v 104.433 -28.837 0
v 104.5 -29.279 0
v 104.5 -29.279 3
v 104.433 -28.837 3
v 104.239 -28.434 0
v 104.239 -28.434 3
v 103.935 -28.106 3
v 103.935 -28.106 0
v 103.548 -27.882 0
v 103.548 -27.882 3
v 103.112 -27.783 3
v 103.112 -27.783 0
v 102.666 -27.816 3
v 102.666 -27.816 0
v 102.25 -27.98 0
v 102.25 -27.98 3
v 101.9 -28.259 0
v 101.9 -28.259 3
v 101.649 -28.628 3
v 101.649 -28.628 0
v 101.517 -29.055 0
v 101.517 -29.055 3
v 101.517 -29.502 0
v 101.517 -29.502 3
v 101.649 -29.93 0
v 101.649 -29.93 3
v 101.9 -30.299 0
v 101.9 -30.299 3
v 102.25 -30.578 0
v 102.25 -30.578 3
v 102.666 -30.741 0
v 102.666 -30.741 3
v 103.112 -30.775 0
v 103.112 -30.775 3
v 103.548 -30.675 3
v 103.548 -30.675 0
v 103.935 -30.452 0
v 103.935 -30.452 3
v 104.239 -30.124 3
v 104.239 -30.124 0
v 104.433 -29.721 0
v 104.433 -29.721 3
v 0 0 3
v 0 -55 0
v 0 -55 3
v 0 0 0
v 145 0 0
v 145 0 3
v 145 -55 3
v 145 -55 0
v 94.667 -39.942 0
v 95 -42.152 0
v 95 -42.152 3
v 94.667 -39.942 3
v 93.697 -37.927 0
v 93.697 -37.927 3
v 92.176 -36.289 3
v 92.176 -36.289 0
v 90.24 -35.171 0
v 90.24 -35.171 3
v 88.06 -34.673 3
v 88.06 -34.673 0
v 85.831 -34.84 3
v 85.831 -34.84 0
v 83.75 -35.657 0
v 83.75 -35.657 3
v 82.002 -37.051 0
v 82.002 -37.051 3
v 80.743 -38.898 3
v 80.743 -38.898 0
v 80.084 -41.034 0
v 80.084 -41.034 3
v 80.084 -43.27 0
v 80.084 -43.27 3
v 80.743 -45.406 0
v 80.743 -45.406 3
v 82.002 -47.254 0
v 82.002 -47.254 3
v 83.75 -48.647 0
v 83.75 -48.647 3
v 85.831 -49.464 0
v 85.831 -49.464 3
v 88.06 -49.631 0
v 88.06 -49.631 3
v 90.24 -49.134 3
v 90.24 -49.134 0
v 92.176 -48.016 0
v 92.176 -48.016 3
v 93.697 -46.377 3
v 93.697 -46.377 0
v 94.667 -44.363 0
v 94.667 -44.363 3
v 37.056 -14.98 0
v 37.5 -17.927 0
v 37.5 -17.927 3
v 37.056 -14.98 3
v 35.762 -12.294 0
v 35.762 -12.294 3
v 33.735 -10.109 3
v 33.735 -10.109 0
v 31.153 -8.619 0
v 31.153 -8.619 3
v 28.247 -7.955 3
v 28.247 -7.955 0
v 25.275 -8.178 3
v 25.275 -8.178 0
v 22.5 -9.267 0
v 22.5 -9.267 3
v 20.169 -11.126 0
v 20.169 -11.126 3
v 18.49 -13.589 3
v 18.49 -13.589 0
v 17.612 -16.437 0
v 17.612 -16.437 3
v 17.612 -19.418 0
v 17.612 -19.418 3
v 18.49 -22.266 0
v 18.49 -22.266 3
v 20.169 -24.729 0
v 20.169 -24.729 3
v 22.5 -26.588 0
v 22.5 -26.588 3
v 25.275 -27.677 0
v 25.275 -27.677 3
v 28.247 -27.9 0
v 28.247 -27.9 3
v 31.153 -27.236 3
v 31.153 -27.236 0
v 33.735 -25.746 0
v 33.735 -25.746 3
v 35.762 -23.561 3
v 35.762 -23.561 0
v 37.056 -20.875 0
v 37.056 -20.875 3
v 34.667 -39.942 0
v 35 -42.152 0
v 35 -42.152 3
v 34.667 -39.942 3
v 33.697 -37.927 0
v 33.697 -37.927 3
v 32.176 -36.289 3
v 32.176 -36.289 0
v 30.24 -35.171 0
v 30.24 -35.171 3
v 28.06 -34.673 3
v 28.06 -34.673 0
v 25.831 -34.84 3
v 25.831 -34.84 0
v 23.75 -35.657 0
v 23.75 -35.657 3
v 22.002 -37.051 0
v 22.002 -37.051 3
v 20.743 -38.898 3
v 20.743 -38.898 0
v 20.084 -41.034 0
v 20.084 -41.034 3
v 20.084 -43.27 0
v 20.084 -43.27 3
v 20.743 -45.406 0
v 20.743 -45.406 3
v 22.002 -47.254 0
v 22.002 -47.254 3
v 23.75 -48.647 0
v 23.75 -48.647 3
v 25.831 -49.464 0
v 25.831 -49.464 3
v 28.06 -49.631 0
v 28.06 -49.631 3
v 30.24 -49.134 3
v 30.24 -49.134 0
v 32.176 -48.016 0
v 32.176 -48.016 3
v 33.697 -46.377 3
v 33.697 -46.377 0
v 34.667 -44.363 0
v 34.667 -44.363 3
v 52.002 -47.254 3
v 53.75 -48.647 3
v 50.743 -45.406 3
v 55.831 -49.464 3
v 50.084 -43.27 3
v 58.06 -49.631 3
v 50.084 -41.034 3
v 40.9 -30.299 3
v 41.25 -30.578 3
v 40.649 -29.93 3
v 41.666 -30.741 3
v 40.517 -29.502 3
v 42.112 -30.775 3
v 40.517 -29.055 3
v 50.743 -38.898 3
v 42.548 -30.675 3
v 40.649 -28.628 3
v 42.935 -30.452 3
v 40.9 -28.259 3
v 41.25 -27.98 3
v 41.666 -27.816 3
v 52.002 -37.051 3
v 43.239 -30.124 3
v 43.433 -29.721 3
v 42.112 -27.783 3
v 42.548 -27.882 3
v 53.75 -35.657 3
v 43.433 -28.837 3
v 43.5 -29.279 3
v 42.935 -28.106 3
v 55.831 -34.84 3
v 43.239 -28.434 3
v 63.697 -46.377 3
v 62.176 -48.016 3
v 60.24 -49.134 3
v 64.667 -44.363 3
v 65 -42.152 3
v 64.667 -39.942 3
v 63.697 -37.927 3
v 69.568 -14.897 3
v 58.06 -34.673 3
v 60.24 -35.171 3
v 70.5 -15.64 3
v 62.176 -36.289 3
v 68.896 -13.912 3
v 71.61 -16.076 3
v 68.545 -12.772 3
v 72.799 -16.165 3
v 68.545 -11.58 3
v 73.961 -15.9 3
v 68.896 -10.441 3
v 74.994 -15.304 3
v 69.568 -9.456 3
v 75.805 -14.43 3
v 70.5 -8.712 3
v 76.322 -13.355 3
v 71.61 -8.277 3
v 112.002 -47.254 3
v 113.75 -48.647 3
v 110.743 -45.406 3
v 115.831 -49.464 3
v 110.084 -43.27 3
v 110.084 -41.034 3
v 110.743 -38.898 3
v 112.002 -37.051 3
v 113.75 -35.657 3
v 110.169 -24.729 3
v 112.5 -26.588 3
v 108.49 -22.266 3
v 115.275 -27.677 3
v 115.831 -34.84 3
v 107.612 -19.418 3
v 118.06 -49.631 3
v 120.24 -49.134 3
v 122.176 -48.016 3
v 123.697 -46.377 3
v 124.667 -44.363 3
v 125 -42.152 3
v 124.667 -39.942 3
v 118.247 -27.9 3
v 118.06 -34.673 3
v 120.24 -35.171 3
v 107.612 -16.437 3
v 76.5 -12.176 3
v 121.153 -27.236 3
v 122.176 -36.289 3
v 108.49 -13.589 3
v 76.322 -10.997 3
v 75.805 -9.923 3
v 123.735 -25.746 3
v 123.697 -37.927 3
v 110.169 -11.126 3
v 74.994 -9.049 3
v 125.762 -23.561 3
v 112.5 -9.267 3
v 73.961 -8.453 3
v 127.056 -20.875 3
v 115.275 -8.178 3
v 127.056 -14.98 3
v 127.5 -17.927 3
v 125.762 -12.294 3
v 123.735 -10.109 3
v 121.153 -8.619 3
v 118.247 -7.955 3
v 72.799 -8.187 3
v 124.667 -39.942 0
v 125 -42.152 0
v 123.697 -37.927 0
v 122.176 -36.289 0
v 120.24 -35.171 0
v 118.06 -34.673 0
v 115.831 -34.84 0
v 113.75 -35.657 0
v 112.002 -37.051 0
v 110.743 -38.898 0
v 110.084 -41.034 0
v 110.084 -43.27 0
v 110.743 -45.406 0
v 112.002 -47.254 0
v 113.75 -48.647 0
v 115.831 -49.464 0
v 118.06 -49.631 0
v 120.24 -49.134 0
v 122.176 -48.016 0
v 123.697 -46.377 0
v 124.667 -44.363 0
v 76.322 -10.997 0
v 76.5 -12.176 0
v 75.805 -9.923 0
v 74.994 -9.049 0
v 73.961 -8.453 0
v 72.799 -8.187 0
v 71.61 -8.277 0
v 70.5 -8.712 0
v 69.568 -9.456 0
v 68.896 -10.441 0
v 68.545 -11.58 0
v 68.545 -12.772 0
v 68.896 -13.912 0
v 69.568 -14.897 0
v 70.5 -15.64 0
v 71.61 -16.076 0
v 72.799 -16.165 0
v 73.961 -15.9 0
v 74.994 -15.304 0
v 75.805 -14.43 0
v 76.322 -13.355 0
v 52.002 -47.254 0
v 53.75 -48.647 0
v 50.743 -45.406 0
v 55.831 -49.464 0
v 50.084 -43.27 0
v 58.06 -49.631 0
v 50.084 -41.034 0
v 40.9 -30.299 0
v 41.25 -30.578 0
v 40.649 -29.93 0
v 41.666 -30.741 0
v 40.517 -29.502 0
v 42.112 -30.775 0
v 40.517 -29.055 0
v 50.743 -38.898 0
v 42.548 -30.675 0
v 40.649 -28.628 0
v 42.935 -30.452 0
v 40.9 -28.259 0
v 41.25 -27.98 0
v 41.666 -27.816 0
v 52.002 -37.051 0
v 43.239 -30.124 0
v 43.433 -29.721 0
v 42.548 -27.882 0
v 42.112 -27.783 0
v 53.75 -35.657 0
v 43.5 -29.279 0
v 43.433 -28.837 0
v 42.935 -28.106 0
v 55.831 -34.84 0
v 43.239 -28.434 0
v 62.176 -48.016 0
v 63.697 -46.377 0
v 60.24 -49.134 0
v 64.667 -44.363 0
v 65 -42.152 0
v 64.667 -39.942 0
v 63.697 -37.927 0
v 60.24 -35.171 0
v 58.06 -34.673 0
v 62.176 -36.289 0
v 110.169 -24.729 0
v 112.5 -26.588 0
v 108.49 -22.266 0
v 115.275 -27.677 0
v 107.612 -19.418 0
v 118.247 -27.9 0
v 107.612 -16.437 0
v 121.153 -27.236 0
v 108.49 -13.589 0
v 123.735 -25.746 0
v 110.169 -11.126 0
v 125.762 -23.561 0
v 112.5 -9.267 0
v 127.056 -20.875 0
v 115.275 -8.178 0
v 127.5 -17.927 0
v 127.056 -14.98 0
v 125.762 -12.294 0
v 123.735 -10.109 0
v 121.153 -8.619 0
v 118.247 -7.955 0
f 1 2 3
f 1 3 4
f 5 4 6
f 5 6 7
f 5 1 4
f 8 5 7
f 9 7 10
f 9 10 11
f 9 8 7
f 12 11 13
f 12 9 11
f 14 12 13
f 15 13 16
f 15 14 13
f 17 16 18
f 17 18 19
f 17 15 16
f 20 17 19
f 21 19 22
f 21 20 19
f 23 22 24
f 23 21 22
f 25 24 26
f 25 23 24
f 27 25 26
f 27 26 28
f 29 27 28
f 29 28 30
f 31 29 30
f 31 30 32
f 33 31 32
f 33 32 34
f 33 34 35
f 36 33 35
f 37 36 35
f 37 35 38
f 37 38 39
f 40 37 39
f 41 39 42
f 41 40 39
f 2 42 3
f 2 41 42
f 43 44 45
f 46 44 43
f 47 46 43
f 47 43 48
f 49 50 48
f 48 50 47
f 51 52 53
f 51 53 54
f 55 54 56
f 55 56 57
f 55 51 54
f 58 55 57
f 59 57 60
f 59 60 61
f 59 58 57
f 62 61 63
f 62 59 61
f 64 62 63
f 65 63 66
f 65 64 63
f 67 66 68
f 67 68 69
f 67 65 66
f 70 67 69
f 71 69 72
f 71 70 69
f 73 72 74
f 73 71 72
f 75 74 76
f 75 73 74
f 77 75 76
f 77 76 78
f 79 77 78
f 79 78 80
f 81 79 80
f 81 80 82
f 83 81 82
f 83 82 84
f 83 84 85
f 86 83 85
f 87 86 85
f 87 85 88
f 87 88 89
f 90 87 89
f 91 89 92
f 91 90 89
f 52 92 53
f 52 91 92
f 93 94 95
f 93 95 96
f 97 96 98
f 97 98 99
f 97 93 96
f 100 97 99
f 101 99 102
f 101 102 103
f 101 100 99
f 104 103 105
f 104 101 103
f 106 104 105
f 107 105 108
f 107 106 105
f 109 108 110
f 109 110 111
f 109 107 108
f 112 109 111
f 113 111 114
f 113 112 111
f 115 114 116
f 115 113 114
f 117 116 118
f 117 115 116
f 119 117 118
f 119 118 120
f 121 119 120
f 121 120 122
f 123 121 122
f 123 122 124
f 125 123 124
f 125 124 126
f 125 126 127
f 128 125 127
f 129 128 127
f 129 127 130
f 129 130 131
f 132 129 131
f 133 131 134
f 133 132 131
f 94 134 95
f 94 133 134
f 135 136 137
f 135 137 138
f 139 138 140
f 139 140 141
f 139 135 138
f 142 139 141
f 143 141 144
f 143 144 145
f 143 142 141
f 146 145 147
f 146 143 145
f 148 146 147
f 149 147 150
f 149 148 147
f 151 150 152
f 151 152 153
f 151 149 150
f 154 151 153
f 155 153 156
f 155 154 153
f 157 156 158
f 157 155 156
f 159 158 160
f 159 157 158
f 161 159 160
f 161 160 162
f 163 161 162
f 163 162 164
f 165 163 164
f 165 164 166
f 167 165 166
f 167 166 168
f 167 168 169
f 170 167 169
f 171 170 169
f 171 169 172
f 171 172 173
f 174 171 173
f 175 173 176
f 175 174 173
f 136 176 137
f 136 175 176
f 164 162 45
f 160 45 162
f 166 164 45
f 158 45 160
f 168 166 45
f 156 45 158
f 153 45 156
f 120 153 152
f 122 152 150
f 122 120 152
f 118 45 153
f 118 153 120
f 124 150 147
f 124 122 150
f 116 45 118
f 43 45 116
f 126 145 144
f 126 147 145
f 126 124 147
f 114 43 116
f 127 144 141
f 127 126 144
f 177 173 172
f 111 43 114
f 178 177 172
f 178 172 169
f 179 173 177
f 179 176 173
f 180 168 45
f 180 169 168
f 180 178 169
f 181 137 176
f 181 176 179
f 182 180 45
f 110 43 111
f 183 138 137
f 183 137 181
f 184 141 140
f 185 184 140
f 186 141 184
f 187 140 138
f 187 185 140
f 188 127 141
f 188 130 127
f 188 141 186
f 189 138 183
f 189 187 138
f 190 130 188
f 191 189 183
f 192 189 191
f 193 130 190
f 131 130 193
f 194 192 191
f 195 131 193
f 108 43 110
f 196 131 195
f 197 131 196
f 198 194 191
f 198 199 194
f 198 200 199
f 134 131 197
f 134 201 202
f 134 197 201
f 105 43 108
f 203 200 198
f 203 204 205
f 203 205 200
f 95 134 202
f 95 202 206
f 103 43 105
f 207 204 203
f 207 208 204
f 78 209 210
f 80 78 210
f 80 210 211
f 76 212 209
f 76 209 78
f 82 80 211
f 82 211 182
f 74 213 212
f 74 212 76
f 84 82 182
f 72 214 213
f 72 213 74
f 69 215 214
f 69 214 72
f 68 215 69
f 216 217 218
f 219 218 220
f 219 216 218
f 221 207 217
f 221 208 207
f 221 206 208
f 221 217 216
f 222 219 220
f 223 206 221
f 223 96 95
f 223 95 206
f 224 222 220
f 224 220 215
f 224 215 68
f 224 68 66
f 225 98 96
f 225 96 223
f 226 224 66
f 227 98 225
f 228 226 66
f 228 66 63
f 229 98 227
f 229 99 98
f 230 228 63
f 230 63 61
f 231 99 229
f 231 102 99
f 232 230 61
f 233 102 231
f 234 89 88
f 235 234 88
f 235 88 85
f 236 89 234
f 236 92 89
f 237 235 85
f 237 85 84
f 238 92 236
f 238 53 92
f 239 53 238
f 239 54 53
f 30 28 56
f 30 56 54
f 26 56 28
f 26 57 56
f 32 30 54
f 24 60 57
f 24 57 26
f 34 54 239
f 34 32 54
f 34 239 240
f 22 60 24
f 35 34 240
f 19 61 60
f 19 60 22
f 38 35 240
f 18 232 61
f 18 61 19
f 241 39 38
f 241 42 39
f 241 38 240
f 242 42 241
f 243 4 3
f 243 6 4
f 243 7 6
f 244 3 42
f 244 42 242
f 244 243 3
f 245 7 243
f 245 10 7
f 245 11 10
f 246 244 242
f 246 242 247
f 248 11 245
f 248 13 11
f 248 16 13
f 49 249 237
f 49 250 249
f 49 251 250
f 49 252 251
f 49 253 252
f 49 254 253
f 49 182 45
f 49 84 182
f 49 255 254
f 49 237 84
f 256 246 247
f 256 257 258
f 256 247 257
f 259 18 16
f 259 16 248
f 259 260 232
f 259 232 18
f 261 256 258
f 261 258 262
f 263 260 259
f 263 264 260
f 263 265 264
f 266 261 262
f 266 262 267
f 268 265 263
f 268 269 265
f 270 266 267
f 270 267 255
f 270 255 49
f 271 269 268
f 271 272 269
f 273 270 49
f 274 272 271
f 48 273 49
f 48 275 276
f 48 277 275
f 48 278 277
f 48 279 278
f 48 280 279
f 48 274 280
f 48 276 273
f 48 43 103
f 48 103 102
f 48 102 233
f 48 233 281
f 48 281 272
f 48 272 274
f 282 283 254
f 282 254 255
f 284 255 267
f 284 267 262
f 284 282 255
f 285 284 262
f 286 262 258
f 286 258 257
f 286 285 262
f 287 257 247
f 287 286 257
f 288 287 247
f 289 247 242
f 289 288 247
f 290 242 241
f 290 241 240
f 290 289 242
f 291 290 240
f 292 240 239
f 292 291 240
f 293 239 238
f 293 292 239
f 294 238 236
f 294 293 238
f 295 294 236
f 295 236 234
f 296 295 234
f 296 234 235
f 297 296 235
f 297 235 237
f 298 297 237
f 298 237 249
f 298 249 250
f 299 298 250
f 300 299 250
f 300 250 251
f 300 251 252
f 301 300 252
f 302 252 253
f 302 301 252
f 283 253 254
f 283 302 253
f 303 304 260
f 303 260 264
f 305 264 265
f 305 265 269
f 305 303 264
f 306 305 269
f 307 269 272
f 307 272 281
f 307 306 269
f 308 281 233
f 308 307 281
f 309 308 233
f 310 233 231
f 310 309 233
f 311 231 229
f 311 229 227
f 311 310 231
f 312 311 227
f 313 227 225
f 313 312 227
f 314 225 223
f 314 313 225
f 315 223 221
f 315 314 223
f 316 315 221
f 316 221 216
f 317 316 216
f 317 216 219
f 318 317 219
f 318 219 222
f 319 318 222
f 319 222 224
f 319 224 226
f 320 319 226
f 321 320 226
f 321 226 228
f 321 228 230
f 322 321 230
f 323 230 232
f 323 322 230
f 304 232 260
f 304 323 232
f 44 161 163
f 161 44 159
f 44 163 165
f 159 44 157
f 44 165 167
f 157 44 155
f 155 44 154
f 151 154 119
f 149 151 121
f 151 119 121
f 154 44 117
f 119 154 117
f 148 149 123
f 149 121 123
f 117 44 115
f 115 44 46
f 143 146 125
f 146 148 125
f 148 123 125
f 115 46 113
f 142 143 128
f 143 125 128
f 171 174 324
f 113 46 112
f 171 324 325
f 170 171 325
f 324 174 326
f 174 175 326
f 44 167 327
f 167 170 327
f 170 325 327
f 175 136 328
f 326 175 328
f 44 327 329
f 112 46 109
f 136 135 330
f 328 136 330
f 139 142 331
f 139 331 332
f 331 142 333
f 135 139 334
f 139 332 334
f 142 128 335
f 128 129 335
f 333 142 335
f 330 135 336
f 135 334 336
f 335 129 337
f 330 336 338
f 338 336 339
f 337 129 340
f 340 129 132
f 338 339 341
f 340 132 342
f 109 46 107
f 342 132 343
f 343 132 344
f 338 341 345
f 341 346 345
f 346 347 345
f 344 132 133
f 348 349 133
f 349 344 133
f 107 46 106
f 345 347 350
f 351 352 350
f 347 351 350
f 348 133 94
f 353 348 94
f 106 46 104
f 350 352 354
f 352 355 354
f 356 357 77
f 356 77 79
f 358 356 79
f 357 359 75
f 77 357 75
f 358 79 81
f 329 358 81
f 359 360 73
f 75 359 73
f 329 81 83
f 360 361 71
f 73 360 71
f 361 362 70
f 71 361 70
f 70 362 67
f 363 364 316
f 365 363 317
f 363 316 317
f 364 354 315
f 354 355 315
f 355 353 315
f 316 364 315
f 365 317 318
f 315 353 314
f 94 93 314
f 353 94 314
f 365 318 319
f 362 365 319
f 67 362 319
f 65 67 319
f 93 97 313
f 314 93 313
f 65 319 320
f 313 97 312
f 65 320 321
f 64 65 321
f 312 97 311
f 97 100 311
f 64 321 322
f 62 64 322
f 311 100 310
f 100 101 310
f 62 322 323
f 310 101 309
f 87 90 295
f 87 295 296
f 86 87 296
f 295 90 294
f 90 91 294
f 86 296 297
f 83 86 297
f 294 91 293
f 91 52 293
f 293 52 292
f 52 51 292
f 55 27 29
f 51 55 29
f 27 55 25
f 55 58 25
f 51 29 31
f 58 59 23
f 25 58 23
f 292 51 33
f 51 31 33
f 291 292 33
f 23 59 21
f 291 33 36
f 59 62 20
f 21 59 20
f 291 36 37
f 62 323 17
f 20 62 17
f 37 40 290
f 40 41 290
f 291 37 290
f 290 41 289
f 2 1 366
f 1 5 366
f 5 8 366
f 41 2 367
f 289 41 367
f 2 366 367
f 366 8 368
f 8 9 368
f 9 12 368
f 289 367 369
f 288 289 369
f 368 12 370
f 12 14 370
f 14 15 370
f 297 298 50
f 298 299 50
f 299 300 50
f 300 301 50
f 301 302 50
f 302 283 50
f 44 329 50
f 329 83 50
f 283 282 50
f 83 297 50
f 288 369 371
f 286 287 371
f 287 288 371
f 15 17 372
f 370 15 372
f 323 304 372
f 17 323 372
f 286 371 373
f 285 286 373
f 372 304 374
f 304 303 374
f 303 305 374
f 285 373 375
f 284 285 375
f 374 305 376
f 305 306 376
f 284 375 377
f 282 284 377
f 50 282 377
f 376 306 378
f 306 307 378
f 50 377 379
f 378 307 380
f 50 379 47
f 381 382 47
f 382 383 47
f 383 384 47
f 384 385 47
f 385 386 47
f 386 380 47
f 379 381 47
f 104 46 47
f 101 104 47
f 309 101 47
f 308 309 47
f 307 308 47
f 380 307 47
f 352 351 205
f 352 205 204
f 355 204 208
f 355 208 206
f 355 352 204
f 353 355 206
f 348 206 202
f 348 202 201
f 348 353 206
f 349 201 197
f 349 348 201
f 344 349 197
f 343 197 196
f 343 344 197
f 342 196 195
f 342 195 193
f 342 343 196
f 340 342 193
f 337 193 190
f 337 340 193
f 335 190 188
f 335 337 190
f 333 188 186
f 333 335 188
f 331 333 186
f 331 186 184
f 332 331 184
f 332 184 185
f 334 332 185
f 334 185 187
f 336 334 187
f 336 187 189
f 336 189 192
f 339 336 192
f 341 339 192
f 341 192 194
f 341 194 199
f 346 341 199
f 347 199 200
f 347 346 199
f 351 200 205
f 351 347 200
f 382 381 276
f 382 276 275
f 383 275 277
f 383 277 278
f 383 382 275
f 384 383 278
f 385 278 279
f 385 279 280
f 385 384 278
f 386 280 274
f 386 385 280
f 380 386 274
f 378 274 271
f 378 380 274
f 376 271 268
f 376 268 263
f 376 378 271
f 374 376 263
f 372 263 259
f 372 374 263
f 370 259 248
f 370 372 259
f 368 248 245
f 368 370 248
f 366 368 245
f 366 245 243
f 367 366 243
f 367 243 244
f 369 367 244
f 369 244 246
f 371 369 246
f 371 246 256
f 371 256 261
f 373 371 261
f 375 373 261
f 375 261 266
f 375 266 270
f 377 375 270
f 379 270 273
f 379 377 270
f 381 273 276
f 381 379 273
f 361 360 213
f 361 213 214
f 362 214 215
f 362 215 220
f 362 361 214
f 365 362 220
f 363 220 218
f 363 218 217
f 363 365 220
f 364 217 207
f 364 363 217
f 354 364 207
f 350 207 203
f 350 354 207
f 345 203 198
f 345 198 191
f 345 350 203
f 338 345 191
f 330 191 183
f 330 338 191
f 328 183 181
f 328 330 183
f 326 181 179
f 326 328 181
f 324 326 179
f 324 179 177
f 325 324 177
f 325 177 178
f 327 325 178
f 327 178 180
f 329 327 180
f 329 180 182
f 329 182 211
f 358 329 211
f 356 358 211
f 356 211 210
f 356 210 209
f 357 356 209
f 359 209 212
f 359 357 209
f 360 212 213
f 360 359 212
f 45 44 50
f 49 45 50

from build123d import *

# Parameters (mm, degrees)
F0_W     = 145
F0_H     = 55
F0_R     = 7.5
F0_R_2   = 1.5
F0_R_3   = 10
F0_R_4   = 4
F1_DEPTH = 3


with BuildPart() as f1:
    # F0 (on Top) → F1 (new body)
    with BuildSketch(Plane.XY):
        with Locations((72.5, -27.5)):
            Rectangle(F0_W, F0_H)
        with Locations((27.5, -42.152297)):
            Circle(F0_R, mode=Mode.SUBTRACT)
        with Locations((57.5, -42.152297)):
            Circle(F0_R, mode=Mode.SUBTRACT)
        with Locations((42, -29.278765)):
            Circle(F0_R_2, mode=Mode.SUBTRACT)
        with Locations((87.5, -42.152297)):
            Circle(F0_R, mode=Mode.SUBTRACT)
        with Locations((117.5, -42.152297)):
            Circle(F0_R, mode=Mode.SUBTRACT)
        with Locations((103, -29.278765)):
            Circle(F0_R_2, mode=Mode.SUBTRACT)
        with Locations((27.5, -17.927479)):
            Circle(F0_R_3, mode=Mode.SUBTRACT)
        with Locations((117.5, -17.927479)):
            Circle(F0_R_3, mode=Mode.SUBTRACT)
        with Locations((72.5, -12.176264)):
            Circle(F0_R_4, mode=Mode.SUBTRACT)
    extrude(amount=F1_DEPTH)


solid = f1.part
